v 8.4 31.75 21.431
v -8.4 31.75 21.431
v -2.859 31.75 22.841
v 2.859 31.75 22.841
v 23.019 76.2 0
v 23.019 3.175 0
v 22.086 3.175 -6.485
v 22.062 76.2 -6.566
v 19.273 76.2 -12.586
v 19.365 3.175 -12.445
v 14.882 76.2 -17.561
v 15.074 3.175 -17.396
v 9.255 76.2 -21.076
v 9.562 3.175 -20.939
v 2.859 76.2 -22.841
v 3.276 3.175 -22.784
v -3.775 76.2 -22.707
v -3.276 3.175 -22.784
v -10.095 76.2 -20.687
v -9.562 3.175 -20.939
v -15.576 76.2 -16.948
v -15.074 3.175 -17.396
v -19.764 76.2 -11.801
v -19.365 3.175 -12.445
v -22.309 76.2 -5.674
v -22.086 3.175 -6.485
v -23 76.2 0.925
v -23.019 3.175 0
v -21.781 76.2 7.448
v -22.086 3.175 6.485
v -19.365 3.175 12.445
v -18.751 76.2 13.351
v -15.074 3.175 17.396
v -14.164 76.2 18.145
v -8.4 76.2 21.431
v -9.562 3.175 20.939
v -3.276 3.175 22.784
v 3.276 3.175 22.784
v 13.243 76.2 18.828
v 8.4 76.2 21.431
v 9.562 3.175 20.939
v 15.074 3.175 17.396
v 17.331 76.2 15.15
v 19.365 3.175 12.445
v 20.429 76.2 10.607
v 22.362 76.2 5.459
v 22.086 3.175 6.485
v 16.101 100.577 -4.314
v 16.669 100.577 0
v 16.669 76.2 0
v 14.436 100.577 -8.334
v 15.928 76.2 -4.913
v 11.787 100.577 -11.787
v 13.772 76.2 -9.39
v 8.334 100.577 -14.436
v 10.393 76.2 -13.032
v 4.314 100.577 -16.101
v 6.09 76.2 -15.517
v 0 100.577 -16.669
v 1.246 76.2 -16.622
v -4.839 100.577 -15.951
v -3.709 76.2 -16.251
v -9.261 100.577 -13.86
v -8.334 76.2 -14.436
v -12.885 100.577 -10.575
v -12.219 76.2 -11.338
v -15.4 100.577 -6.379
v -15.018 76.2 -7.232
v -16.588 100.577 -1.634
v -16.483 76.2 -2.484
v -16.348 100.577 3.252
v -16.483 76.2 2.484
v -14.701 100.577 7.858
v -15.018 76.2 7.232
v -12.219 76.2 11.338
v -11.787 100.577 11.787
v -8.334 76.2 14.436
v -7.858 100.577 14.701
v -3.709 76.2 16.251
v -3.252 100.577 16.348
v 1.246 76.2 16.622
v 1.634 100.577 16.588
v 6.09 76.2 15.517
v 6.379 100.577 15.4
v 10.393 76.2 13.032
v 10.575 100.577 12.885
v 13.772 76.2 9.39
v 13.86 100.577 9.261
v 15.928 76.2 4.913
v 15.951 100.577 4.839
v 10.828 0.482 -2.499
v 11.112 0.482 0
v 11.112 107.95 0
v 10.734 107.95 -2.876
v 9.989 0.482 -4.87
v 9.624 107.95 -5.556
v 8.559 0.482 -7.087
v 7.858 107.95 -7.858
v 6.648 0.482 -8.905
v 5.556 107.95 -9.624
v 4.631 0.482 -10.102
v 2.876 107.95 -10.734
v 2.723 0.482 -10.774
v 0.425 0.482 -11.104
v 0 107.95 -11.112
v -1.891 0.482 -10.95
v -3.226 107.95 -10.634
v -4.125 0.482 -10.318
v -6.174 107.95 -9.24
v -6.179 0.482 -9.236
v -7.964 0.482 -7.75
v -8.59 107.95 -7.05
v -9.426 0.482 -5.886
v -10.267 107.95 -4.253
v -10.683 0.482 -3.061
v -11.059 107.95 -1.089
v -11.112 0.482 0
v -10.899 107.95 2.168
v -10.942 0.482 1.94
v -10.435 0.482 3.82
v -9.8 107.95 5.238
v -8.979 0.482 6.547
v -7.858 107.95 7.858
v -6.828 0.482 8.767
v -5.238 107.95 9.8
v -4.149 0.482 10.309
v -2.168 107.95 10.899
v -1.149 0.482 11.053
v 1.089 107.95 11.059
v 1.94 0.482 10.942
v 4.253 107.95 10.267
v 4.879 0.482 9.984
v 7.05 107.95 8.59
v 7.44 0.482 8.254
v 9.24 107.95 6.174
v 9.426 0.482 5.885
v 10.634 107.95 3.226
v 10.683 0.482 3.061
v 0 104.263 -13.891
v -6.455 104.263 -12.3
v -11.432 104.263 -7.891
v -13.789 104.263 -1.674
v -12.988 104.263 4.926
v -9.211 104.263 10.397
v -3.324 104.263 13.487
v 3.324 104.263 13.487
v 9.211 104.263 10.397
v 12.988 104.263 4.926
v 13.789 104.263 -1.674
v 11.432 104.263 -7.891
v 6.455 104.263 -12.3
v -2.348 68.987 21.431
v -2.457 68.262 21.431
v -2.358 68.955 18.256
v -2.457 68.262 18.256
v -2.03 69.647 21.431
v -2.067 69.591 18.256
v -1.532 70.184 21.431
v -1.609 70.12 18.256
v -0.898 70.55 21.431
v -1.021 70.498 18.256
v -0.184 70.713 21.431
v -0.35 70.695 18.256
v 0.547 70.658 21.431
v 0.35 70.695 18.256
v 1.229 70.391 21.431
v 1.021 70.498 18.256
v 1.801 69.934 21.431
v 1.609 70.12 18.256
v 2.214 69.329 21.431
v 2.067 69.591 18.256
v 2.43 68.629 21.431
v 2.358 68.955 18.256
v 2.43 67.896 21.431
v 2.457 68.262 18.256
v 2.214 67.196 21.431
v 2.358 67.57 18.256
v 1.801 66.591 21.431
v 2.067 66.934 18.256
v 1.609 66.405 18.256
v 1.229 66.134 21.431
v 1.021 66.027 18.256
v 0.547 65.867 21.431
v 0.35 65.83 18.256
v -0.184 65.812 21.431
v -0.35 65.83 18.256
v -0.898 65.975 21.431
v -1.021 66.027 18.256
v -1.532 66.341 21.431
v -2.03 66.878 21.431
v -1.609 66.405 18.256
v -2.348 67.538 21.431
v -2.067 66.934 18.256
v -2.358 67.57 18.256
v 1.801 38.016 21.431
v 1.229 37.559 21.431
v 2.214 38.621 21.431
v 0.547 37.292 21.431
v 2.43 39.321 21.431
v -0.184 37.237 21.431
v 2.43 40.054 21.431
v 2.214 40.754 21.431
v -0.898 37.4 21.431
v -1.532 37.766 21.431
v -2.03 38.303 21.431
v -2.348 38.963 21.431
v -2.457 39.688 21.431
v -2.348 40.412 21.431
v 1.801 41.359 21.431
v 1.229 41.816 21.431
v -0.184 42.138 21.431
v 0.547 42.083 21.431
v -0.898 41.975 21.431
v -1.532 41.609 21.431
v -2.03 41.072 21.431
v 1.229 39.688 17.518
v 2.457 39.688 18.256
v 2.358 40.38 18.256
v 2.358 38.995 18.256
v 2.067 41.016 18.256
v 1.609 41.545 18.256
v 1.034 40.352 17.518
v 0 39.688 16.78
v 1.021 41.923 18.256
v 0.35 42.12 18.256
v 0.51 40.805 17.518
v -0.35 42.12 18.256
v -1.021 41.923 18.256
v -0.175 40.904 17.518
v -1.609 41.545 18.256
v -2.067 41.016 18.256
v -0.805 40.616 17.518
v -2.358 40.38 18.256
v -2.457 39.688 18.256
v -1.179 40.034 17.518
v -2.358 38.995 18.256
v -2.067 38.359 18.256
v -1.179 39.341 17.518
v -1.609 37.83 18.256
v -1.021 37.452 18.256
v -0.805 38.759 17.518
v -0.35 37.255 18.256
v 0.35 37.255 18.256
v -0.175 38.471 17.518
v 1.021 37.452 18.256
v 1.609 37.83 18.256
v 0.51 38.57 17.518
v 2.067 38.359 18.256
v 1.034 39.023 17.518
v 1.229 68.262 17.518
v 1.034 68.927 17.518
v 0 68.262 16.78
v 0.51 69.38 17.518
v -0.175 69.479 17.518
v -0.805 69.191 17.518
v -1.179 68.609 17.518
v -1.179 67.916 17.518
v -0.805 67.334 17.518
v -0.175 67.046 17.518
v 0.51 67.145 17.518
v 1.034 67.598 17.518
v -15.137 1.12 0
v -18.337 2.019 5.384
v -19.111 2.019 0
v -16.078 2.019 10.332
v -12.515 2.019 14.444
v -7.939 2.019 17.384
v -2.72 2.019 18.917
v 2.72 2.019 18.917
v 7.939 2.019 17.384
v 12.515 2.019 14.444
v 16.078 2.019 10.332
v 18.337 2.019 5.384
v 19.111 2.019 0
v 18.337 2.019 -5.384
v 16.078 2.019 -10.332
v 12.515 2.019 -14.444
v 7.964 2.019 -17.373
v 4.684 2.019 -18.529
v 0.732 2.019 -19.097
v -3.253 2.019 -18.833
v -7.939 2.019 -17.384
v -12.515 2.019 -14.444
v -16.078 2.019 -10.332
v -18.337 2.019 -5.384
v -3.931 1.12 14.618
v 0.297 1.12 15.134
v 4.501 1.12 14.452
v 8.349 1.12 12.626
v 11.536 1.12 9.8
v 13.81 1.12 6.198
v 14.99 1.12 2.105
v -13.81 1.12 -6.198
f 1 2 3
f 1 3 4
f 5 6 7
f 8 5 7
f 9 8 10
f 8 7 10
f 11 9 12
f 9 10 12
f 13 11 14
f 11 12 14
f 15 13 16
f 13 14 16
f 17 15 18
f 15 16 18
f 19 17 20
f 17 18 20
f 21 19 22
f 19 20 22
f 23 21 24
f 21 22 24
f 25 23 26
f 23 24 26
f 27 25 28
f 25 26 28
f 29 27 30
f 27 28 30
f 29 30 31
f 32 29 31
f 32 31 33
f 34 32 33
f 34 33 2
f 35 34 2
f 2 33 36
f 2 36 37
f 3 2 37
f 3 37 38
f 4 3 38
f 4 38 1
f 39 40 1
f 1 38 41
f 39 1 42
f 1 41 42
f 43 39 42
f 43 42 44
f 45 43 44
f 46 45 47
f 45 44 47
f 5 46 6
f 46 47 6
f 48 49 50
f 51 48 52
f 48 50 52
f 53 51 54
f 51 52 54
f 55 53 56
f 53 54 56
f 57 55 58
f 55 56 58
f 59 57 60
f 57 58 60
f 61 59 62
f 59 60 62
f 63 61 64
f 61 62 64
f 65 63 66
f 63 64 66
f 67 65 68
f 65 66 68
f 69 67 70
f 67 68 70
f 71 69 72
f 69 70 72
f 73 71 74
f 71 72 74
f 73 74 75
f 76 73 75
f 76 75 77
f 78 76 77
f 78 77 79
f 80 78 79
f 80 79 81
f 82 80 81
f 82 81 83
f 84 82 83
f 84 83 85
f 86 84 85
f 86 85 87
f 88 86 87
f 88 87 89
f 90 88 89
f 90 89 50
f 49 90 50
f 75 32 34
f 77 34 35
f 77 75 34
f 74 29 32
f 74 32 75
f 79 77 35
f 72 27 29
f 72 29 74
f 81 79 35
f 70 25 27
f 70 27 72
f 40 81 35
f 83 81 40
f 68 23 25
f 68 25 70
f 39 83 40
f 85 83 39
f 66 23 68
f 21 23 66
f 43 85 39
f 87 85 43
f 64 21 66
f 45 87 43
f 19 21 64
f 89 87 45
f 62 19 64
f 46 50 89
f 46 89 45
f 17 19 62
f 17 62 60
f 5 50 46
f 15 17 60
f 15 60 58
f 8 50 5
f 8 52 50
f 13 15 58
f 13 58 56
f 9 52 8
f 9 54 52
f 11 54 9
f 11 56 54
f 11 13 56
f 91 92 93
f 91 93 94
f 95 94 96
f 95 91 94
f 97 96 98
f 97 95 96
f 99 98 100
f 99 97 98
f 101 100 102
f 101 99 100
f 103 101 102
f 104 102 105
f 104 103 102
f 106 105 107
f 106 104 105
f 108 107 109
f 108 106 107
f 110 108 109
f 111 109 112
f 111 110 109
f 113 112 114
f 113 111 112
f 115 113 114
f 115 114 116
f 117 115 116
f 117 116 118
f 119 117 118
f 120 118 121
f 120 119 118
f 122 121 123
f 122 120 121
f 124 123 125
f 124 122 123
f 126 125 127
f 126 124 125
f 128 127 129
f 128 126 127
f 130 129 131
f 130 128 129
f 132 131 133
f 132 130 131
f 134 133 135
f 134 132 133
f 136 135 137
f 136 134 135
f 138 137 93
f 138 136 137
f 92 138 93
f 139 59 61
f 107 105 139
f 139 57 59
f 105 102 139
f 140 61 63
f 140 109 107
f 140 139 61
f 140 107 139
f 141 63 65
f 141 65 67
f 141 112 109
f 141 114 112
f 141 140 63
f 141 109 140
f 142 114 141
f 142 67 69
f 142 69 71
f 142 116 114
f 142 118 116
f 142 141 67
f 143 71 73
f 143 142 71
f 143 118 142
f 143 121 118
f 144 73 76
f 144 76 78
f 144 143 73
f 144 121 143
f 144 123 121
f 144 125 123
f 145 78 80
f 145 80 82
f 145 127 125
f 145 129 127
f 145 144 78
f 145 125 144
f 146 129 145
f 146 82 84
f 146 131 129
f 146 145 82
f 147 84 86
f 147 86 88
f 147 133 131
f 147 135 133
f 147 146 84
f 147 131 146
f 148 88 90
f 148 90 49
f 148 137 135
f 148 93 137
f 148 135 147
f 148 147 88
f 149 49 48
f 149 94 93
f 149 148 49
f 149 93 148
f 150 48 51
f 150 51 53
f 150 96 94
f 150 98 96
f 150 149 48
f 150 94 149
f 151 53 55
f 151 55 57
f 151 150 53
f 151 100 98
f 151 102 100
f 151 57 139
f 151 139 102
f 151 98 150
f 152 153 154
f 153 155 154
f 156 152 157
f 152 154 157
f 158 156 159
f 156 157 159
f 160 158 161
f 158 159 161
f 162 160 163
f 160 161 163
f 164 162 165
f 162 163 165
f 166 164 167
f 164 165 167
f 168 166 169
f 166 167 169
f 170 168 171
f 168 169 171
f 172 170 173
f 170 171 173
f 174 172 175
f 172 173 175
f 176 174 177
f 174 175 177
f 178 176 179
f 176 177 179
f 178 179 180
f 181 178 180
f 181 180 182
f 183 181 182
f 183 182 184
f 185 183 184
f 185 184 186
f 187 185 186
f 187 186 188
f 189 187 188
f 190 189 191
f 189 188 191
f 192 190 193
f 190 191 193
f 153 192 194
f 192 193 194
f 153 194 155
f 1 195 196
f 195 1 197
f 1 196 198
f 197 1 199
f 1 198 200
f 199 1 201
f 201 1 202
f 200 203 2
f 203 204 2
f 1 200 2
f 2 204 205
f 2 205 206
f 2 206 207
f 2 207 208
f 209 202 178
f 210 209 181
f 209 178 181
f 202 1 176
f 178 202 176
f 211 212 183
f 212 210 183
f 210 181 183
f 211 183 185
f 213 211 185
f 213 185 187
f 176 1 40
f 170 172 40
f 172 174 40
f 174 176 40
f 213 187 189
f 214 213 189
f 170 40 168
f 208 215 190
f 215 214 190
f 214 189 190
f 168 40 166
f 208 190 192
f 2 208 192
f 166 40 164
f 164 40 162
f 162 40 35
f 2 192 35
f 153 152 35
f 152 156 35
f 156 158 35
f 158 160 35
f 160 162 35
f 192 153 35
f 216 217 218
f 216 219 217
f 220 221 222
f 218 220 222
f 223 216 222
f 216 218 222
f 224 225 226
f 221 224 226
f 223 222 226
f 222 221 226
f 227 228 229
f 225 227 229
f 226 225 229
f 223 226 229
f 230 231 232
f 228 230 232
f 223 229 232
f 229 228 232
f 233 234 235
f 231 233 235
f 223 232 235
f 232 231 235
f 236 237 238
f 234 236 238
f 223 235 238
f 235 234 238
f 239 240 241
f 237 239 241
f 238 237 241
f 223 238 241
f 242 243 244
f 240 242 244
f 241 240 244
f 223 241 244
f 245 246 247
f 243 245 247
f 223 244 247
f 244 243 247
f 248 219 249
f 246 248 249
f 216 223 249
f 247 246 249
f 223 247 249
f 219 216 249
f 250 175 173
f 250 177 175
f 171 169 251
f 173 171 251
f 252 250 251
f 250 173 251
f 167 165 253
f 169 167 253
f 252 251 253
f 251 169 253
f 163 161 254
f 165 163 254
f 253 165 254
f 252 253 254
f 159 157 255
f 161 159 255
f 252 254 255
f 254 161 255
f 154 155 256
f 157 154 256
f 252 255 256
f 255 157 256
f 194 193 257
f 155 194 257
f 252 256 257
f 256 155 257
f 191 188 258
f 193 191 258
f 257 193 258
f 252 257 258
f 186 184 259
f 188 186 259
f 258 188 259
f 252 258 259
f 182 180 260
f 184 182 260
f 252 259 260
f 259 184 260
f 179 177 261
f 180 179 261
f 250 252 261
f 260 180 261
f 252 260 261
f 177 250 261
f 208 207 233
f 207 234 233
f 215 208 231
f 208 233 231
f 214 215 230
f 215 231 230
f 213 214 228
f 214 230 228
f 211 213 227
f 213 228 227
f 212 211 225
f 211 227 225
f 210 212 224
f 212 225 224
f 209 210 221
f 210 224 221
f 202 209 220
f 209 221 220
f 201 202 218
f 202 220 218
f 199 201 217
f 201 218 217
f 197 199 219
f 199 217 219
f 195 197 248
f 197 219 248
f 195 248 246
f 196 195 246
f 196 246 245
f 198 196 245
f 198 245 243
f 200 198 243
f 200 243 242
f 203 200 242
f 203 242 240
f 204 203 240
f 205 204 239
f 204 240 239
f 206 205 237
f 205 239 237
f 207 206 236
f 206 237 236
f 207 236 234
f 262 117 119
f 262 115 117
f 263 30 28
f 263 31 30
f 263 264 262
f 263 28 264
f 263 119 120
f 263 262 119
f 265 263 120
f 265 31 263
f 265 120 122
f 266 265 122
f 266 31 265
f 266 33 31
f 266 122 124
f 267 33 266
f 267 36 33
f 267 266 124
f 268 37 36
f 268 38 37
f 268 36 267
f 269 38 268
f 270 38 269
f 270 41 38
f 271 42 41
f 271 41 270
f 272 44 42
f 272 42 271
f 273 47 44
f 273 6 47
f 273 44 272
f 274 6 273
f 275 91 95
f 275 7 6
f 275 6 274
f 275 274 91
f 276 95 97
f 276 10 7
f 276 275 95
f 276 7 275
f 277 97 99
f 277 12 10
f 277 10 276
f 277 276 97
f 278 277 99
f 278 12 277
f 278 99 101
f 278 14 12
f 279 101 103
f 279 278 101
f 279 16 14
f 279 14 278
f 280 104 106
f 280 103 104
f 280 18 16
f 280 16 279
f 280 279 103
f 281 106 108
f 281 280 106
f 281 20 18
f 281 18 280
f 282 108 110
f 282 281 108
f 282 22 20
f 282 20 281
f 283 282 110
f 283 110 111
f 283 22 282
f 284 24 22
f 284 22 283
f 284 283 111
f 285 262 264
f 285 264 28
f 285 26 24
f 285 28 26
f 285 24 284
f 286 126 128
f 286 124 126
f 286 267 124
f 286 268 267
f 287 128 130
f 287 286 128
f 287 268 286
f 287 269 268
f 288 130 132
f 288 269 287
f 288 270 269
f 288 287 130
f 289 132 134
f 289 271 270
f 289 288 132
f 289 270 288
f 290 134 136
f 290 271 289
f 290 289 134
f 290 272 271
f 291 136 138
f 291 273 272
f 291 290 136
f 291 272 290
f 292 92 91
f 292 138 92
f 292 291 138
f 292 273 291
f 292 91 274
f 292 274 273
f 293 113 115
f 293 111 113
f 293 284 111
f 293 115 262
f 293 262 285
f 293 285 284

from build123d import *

# Parameters (mm, degrees)
SKETCH1_R                        = 23.01875
SKETCH1_R_2                      = 11.1125
BOSS_EXTRUDE1_DEPTH              = 76.2
SKETCH2_R                        = 16.66875
SKETCH2_R_2                      = 11.1125
BOSS_EXTRUDE2_DEPTH              = 31.75
CUT_EXTRUDE1_START               = -44.45
CUT_EXTRUDE1_DEPTH               = 44.45
F_10_0_1935_DIAMETER_HOLE1_D     = 4.9149
F_10_0_1935_DIAMETER_HOLE1_DEPTH = 3.175
F_10_0_1935_DIAMETER_HOLE1_TIP   = 1.476584928


with BuildPart() as part:
    # Sketch1 → Boss-Extrude1 (new body)
    with BuildSketch(Plane(origin=(0, 0, 0), x_dir=(1, 0, 0), z_dir=(0, 1, 0))):
        Circle(SKETCH1_R)
        Circle(SKETCH1_R_2, mode=Mode.SUBTRACT)
    extrude(amount=BOSS_EXTRUDE1_DEPTH)

    # Sketch2 → Boss-Extrude2 (add)
    with BuildSketch(Plane(origin=(0, 76.2, 0), x_dir=(1, 0, 0), z_dir=(0, 1, 0))):
        Circle(SKETCH2_R)
        Circle(SKETCH2_R_2, mode=Mode.SUBTRACT)
    extrude(amount=BOSS_EXTRUDE2_DEPTH)

    # Sketch3 → Cut-Revolve1 (revolve, cut)
    with BuildSketch(Plane(origin=(0, 0, 0), x_dir=(0, 0, -1), z_dir=(1, 0, 0))):
        Polygon((16.66875, 107.95), (16.66875, 100.57660721), (11.1125, 107.95), align=None)
    revolve(axis=Axis((0, 107.95, 0), (0, 1, 0)), mode=Mode.SUBTRACT)

    # Sketch4 → Cut-Extrude1 (cut)
    with BuildSketch(Plane(origin=(0, 76.2, 0), x_dir=(1, 0, 0), z_dir=(0, 1, 0)).offset(CUT_EXTRUDE1_START)):
        with BuildLine():
            Line((8.400260413, -21.43125), (-8.400260413, -21.43125))
            ThreePointArc((-8.400260413, -21.43125), (0, -23.01875), (8.400260413, -21.43125))
        make_face()
    extrude(amount=CUT_EXTRUDE1_DEPTH, mode=Mode.SUBTRACT)

    # Sketch8 → Cut-Revolve4 (revolve, cut)
    with BuildSketch(Plane.XY):
        with BuildLine():
            Line((0, 0), (-3.369464108, 0))
            ThreePointArc((-3.369464108, 0), (-13.321537524, 0.798864496), (-23.01875, 3.175))
            Line((-23.01875, 3.175), (-23.01875, -4.469484217))
            Line((-23.01875, -4.469484217), (0, -4.469484217))
            Line((0, -4.469484217), (0, 0))
        make_face()
    revolve(axis=Axis((0, 0, 0), (0, 1, 0)), mode=Mode.SUBTRACT)

    # 10 _0.1935_ Diameter Hole1
    with Locations(Plane.XY.offset(21.43125)):
        with Locations((0, 68.2625), (0, 39.6875)):
            Hole(F_10_0_1935_DIAMETER_HOLE1_D / 2, depth=F_10_0_1935_DIAMETER_HOLE1_DEPTH)
            with Locations((0, 0, -(F_10_0_1935_DIAMETER_HOLE1_DEPTH + F_10_0_1935_DIAMETER_HOLE1_TIP / 2))):  # 118° drill point
                Cone(0, F_10_0_1935_DIAMETER_HOLE1_D / 2, F_10_0_1935_DIAMETER_HOLE1_TIP, mode=Mode.SUBTRACT)


solid = part.part
